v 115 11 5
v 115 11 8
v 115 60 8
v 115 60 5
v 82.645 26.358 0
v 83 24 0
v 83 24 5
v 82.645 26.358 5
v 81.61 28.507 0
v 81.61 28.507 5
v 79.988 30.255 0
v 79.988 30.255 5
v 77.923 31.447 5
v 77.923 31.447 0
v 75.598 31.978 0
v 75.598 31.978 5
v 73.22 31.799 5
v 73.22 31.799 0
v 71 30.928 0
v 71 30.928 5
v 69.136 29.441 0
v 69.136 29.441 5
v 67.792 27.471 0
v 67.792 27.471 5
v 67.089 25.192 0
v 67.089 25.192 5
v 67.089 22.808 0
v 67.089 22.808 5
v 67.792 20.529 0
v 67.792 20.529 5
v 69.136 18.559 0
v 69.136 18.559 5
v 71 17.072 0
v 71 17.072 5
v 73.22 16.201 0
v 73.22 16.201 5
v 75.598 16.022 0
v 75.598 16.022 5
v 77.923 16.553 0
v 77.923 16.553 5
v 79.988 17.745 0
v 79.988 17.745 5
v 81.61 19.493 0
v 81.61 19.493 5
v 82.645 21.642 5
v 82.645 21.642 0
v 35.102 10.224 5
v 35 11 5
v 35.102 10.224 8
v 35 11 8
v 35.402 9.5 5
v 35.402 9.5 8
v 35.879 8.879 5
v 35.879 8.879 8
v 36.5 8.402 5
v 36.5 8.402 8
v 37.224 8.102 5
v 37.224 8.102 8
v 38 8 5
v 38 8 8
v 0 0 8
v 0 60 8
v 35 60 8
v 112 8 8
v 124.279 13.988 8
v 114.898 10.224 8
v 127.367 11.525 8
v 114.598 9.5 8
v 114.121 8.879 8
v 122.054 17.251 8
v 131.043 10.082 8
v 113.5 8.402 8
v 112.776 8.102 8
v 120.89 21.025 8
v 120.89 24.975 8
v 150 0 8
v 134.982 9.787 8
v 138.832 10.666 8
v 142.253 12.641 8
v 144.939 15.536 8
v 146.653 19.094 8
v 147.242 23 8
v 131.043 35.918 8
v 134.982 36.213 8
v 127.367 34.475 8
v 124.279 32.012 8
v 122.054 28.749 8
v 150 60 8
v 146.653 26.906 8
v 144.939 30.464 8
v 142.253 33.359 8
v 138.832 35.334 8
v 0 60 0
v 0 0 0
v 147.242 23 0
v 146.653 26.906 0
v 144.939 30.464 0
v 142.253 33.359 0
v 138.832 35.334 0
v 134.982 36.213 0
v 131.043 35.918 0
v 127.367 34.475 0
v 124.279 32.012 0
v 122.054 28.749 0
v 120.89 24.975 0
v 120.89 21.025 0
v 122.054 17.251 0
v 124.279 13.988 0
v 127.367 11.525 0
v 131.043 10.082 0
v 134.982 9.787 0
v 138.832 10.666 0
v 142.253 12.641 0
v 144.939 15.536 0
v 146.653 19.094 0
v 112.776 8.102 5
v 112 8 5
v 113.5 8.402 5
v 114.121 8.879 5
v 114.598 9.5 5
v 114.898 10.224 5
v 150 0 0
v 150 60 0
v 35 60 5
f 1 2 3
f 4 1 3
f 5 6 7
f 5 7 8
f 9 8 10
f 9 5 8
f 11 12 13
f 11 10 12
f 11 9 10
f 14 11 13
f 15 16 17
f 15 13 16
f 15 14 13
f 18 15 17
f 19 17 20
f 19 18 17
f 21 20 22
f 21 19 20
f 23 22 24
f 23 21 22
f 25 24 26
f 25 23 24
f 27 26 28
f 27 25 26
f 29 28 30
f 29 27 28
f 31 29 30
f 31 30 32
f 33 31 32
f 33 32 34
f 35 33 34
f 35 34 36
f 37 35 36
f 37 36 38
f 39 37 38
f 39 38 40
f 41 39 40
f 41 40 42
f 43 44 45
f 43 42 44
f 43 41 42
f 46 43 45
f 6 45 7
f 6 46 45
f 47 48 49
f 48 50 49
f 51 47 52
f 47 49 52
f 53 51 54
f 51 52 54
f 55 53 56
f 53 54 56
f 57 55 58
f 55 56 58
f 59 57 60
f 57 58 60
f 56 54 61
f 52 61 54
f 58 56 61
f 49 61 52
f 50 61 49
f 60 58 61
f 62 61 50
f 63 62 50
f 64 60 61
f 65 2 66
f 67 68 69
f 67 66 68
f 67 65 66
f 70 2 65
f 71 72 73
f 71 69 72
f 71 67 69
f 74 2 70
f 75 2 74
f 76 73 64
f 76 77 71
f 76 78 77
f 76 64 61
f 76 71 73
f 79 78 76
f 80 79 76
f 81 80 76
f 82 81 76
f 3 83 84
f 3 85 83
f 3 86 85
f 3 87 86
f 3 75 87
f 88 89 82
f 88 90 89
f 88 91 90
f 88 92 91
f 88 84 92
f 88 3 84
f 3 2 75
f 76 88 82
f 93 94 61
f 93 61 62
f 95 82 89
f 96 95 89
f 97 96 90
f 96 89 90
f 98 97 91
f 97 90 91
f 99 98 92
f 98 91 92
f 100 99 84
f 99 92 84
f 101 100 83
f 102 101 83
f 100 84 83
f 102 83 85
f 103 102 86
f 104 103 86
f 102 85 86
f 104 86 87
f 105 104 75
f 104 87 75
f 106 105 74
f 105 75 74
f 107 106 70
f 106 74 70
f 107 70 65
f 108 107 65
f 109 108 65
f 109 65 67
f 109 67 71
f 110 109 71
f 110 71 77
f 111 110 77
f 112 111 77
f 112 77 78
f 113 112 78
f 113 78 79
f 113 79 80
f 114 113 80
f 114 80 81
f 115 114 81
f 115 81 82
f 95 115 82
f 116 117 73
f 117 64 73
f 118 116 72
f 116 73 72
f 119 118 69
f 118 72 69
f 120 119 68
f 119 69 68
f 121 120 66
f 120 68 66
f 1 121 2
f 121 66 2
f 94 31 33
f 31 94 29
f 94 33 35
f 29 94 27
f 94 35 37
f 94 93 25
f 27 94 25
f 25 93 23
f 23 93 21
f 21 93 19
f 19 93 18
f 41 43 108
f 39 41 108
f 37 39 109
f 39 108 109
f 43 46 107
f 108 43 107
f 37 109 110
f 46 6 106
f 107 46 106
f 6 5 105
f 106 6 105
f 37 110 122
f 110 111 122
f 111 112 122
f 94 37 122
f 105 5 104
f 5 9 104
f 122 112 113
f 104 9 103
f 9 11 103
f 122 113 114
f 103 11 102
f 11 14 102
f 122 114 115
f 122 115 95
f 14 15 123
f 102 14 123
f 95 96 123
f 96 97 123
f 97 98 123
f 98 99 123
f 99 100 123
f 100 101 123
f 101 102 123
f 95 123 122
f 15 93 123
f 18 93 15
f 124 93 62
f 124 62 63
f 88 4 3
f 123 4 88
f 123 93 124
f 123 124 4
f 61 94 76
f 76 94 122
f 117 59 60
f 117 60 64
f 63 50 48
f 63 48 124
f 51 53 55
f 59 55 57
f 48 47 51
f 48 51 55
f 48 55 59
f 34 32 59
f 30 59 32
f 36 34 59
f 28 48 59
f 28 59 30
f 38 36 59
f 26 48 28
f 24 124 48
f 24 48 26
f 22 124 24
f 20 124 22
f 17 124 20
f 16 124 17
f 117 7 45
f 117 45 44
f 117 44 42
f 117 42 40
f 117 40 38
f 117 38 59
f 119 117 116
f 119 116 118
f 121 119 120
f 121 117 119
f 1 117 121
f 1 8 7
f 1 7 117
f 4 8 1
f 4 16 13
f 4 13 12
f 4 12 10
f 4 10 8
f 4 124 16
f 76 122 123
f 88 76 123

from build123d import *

# Parameters (mm, degrees)
ESQUISSE1_W                  = 150
ESQUISSE1_H                  = 60
BOSS_EXTRU_1_DEPTH           = 8
ESQUISSE2_W                  = 80
ESQUISSE2_H                  = 60
ENL_V_MAT_EXTRU_1_DEPTH      = 3
ENL_V_MAT_EXTRU_2_DEPTH      = 162.632298752
ENL_V_MAT_EXTRU_2_DEPTH_BACK = 162.632298752
ESQUISSE3_R                  = 8
ESQUISSE4_W                  = 80
ESQUISSE4_H                  = 8
BOSS_EXTRU_2_DEPTH           = 3
CONG_1_R                     = 3
ESQUISSE5_R                  = 13.25
ENL_V_MAT_EXTRU_3_DEPTH      = 162.752897965


with BuildPart() as part:
    # Esquisse1 → Boss.-Extru.1 (new body)
    with BuildSketch(Plane.XY):
        with Locations((75, 30)):
            Rectangle(ESQUISSE1_W, ESQUISSE1_H)
    extrude(amount=BOSS_EXTRU_1_DEPTH)

    # Esquisse2 → Enlèv. mat.-Extru.1 (cut)
    with BuildSketch(Plane.XY.offset(8)):
        with Locations((75, 30)):
            Rectangle(ESQUISSE2_W, ESQUISSE2_H)
    extrude(amount=-ENL_V_MAT_EXTRU_1_DEPTH, mode=Mode.SUBTRACT)

    # Esquisse3 → Enlèv. mat.-Extru.2 (cut, two sides: drawn at the far end of the back side and taken through both)
    with BuildSketch(Plane.XY.offset(5).offset(-ENL_V_MAT_EXTRU_2_DEPTH_BACK)):
        with Locations((75, 24)):
            Circle(ESQUISSE3_R)
    extrude(amount=ENL_V_MAT_EXTRU_2_DEPTH + ENL_V_MAT_EXTRU_2_DEPTH_BACK, mode=Mode.SUBTRACT)

    # Esquisse4 → Boss.-Extru.2 (add)
    with BuildSketch(Plane.XY.offset(5)):
        with Locations((75, 4)):
            Rectangle(ESQUISSE4_W, ESQUISSE4_H)
    extrude(amount=BOSS_EXTRU_2_DEPTH)

    # Congé1
    cong_1_edges = [part.edges().sort_by_distance(p)[0] for p in [
        (35, 8, 6.5),
        (115, 8, 6.5),
    ]]
    fillet(cong_1_edges, radius=CONG_1_R)

    # Esquisse5 → Enlèv. mat.-Extru.3 (cut, through all)
    with BuildSketch(Plane.XY.offset(8)):
        with Locations((133.991524815, 23)):
            Circle(ESQUISSE5_R)
    extrude(amount=-ENL_V_MAT_EXTRU_3_DEPTH, mode=Mode.SUBTRACT)


solid = part.part
